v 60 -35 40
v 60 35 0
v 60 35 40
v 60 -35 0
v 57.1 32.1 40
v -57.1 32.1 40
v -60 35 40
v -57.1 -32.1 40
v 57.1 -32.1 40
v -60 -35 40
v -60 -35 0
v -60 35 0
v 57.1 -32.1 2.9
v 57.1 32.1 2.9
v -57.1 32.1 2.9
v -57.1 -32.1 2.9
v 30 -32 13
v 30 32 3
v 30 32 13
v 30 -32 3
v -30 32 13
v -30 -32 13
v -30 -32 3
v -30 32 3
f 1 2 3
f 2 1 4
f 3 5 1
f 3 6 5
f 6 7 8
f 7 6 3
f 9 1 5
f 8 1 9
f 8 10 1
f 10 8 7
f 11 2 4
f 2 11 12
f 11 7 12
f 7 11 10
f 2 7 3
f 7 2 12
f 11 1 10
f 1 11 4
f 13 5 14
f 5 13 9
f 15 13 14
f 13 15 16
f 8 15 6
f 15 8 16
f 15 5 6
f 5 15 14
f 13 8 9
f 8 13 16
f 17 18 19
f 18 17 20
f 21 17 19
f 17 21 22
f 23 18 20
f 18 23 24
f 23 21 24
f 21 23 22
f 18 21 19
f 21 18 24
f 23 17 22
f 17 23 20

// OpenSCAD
// Parameters (mm)
outer_x = 120;               // outer dimension X
outer_y = 70;                // outer dimension Y
outer_z = 40;                // outer dimension Z (height)
wall_thick = 3;              // wall thickness
floor_thick = 3;             // floor thickness

inner_x = outer_x - 2*wall_thick;   // inner cavity X
inner_y = outer_y - 2*wall_thick;   // inner cavity Y
inner_z = outer_z - floor_thick;    // inner cavity Z (open top)

platform_len = 60;           // platform length in X (centered)
platform_top_z = 13;         // absolute Z of platform top
platform_bottom_z = floor_thick; // absolute Z of inner floor
platform_thick = platform_top_z - platform_bottom_z; // platform thickness

hole_d = 2;                  // electrode hole diameter
hole_r = hole_d/2;
hole_z = 30;                 // absolute Z of hole centre
hole_y = 0;                  // absolute Y of hole centre (center line)

// Set resolution for curved features
$fn = 64;

// Helper: outer shell (outer cube minus inner cavity)
module outer_shell() {
    difference() {
        // outer solid, centred on origin
        translate([-outer_x/2, -outer_y/2, 0])
            cube([outer_x, outer_y, outer_z]);

        // inner cavity, slightly oversized to avoid coplanar faces
        translate([-inner_x/2 - 0.1, -inner_y/2 - 0.1, floor_thick - 0.1])
            cube([inner_x + 0.2, inner_y + 0.2, inner_z + 0.2]);
    }
}

// Helper: solid platform
module platform() {
    translate([-platform_len/2, -inner_y/2, floor_thick])
        cube([platform_len, inner_y, platform_thick]);
}

// Helper: electrode holes through end walls
module electrode_holes() {
    // left wall
    translate([-(outer_x/2) + wall_thick/2, hole_y, hole_z])
        rotate([0, 90, 0])
            cylinder(h = wall_thick + 0.2, r = hole_r, center = true);
    // right wall
    translate([(outer_x/2) - wall_thick/2, hole_y, hole_z])
        rotate([0, 90, 0])
            cylinder(h = wall_thick + 0.2, r = hole_r, center = true);
}

// Final part
union() {
    outer_shell();          // tank shell
    platform();             // raised platform (added solid)
}
difference() {
    // nothing to subtract here – the union already contains all solid material
    // we just need to cut the electrode holes
    // (the outer_shell already has an inner cavity, so no further subtraction needed)
    // The holes are cut from the whole part
    // (using a separate difference ensures the holes are cleanly removed)
    // The outer union is the first argument of the difference
    // (the union() above is the implicit first argument, but OpenSCAD requires explicit)
    // We'll write the whole model as a single union and then subtract holes.
}
 // The above syntax is a placeholder; the actual model is built as:
 
// Build the solid part and then cut the holes
module final_model() {
    difference() {
        union() {
            outer_shell();
            platform();
        }
        // electrode holes (extend slightly beyond the wall)
        // left wall
        translate([-(outer_x/2) + wall_thick/2, hole_y, hole_z])
            rotate([0, 90, 0])
                cylinder(h = wall_thick + 0.2, r = hole_r, center = true);
        // right wall
        translate([(outer_x/2) - wall_thick/2, hole_y, hole_z])
            rotate([0, 90, 0])
                cylinder(h = wall_thick + 0.2, r = hole_r, center = true);
    }
}

// Render the model
final_model();
